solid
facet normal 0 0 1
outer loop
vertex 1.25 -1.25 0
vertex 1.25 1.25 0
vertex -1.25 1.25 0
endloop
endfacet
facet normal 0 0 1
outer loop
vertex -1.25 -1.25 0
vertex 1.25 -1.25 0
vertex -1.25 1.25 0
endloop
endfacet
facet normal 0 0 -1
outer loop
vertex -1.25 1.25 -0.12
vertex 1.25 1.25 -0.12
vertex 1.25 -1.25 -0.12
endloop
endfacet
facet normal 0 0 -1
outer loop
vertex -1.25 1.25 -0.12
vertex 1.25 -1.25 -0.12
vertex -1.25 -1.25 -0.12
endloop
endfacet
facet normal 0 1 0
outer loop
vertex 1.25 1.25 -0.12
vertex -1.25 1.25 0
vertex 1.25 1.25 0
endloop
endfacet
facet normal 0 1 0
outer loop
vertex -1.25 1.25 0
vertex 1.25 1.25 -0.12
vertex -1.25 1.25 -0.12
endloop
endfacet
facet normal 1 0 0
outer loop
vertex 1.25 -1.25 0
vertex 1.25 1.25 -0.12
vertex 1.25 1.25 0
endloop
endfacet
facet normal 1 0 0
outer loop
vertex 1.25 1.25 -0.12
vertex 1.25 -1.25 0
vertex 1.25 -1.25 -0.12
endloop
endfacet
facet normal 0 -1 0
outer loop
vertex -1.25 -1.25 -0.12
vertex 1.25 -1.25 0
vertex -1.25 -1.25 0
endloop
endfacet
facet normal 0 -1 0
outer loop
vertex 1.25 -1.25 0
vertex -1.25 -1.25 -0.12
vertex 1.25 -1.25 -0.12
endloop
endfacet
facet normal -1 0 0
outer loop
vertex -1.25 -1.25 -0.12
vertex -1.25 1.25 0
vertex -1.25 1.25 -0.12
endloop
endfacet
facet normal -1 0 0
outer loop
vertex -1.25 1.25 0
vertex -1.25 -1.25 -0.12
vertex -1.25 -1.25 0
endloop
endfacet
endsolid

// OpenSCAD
// Shed shell kit: roof flat. See lib/lodge_kit.scad.
include <lib/lodge_kit.scad>
kind = "shed";
roof_tile([0, 0, 0, 0], 0);
